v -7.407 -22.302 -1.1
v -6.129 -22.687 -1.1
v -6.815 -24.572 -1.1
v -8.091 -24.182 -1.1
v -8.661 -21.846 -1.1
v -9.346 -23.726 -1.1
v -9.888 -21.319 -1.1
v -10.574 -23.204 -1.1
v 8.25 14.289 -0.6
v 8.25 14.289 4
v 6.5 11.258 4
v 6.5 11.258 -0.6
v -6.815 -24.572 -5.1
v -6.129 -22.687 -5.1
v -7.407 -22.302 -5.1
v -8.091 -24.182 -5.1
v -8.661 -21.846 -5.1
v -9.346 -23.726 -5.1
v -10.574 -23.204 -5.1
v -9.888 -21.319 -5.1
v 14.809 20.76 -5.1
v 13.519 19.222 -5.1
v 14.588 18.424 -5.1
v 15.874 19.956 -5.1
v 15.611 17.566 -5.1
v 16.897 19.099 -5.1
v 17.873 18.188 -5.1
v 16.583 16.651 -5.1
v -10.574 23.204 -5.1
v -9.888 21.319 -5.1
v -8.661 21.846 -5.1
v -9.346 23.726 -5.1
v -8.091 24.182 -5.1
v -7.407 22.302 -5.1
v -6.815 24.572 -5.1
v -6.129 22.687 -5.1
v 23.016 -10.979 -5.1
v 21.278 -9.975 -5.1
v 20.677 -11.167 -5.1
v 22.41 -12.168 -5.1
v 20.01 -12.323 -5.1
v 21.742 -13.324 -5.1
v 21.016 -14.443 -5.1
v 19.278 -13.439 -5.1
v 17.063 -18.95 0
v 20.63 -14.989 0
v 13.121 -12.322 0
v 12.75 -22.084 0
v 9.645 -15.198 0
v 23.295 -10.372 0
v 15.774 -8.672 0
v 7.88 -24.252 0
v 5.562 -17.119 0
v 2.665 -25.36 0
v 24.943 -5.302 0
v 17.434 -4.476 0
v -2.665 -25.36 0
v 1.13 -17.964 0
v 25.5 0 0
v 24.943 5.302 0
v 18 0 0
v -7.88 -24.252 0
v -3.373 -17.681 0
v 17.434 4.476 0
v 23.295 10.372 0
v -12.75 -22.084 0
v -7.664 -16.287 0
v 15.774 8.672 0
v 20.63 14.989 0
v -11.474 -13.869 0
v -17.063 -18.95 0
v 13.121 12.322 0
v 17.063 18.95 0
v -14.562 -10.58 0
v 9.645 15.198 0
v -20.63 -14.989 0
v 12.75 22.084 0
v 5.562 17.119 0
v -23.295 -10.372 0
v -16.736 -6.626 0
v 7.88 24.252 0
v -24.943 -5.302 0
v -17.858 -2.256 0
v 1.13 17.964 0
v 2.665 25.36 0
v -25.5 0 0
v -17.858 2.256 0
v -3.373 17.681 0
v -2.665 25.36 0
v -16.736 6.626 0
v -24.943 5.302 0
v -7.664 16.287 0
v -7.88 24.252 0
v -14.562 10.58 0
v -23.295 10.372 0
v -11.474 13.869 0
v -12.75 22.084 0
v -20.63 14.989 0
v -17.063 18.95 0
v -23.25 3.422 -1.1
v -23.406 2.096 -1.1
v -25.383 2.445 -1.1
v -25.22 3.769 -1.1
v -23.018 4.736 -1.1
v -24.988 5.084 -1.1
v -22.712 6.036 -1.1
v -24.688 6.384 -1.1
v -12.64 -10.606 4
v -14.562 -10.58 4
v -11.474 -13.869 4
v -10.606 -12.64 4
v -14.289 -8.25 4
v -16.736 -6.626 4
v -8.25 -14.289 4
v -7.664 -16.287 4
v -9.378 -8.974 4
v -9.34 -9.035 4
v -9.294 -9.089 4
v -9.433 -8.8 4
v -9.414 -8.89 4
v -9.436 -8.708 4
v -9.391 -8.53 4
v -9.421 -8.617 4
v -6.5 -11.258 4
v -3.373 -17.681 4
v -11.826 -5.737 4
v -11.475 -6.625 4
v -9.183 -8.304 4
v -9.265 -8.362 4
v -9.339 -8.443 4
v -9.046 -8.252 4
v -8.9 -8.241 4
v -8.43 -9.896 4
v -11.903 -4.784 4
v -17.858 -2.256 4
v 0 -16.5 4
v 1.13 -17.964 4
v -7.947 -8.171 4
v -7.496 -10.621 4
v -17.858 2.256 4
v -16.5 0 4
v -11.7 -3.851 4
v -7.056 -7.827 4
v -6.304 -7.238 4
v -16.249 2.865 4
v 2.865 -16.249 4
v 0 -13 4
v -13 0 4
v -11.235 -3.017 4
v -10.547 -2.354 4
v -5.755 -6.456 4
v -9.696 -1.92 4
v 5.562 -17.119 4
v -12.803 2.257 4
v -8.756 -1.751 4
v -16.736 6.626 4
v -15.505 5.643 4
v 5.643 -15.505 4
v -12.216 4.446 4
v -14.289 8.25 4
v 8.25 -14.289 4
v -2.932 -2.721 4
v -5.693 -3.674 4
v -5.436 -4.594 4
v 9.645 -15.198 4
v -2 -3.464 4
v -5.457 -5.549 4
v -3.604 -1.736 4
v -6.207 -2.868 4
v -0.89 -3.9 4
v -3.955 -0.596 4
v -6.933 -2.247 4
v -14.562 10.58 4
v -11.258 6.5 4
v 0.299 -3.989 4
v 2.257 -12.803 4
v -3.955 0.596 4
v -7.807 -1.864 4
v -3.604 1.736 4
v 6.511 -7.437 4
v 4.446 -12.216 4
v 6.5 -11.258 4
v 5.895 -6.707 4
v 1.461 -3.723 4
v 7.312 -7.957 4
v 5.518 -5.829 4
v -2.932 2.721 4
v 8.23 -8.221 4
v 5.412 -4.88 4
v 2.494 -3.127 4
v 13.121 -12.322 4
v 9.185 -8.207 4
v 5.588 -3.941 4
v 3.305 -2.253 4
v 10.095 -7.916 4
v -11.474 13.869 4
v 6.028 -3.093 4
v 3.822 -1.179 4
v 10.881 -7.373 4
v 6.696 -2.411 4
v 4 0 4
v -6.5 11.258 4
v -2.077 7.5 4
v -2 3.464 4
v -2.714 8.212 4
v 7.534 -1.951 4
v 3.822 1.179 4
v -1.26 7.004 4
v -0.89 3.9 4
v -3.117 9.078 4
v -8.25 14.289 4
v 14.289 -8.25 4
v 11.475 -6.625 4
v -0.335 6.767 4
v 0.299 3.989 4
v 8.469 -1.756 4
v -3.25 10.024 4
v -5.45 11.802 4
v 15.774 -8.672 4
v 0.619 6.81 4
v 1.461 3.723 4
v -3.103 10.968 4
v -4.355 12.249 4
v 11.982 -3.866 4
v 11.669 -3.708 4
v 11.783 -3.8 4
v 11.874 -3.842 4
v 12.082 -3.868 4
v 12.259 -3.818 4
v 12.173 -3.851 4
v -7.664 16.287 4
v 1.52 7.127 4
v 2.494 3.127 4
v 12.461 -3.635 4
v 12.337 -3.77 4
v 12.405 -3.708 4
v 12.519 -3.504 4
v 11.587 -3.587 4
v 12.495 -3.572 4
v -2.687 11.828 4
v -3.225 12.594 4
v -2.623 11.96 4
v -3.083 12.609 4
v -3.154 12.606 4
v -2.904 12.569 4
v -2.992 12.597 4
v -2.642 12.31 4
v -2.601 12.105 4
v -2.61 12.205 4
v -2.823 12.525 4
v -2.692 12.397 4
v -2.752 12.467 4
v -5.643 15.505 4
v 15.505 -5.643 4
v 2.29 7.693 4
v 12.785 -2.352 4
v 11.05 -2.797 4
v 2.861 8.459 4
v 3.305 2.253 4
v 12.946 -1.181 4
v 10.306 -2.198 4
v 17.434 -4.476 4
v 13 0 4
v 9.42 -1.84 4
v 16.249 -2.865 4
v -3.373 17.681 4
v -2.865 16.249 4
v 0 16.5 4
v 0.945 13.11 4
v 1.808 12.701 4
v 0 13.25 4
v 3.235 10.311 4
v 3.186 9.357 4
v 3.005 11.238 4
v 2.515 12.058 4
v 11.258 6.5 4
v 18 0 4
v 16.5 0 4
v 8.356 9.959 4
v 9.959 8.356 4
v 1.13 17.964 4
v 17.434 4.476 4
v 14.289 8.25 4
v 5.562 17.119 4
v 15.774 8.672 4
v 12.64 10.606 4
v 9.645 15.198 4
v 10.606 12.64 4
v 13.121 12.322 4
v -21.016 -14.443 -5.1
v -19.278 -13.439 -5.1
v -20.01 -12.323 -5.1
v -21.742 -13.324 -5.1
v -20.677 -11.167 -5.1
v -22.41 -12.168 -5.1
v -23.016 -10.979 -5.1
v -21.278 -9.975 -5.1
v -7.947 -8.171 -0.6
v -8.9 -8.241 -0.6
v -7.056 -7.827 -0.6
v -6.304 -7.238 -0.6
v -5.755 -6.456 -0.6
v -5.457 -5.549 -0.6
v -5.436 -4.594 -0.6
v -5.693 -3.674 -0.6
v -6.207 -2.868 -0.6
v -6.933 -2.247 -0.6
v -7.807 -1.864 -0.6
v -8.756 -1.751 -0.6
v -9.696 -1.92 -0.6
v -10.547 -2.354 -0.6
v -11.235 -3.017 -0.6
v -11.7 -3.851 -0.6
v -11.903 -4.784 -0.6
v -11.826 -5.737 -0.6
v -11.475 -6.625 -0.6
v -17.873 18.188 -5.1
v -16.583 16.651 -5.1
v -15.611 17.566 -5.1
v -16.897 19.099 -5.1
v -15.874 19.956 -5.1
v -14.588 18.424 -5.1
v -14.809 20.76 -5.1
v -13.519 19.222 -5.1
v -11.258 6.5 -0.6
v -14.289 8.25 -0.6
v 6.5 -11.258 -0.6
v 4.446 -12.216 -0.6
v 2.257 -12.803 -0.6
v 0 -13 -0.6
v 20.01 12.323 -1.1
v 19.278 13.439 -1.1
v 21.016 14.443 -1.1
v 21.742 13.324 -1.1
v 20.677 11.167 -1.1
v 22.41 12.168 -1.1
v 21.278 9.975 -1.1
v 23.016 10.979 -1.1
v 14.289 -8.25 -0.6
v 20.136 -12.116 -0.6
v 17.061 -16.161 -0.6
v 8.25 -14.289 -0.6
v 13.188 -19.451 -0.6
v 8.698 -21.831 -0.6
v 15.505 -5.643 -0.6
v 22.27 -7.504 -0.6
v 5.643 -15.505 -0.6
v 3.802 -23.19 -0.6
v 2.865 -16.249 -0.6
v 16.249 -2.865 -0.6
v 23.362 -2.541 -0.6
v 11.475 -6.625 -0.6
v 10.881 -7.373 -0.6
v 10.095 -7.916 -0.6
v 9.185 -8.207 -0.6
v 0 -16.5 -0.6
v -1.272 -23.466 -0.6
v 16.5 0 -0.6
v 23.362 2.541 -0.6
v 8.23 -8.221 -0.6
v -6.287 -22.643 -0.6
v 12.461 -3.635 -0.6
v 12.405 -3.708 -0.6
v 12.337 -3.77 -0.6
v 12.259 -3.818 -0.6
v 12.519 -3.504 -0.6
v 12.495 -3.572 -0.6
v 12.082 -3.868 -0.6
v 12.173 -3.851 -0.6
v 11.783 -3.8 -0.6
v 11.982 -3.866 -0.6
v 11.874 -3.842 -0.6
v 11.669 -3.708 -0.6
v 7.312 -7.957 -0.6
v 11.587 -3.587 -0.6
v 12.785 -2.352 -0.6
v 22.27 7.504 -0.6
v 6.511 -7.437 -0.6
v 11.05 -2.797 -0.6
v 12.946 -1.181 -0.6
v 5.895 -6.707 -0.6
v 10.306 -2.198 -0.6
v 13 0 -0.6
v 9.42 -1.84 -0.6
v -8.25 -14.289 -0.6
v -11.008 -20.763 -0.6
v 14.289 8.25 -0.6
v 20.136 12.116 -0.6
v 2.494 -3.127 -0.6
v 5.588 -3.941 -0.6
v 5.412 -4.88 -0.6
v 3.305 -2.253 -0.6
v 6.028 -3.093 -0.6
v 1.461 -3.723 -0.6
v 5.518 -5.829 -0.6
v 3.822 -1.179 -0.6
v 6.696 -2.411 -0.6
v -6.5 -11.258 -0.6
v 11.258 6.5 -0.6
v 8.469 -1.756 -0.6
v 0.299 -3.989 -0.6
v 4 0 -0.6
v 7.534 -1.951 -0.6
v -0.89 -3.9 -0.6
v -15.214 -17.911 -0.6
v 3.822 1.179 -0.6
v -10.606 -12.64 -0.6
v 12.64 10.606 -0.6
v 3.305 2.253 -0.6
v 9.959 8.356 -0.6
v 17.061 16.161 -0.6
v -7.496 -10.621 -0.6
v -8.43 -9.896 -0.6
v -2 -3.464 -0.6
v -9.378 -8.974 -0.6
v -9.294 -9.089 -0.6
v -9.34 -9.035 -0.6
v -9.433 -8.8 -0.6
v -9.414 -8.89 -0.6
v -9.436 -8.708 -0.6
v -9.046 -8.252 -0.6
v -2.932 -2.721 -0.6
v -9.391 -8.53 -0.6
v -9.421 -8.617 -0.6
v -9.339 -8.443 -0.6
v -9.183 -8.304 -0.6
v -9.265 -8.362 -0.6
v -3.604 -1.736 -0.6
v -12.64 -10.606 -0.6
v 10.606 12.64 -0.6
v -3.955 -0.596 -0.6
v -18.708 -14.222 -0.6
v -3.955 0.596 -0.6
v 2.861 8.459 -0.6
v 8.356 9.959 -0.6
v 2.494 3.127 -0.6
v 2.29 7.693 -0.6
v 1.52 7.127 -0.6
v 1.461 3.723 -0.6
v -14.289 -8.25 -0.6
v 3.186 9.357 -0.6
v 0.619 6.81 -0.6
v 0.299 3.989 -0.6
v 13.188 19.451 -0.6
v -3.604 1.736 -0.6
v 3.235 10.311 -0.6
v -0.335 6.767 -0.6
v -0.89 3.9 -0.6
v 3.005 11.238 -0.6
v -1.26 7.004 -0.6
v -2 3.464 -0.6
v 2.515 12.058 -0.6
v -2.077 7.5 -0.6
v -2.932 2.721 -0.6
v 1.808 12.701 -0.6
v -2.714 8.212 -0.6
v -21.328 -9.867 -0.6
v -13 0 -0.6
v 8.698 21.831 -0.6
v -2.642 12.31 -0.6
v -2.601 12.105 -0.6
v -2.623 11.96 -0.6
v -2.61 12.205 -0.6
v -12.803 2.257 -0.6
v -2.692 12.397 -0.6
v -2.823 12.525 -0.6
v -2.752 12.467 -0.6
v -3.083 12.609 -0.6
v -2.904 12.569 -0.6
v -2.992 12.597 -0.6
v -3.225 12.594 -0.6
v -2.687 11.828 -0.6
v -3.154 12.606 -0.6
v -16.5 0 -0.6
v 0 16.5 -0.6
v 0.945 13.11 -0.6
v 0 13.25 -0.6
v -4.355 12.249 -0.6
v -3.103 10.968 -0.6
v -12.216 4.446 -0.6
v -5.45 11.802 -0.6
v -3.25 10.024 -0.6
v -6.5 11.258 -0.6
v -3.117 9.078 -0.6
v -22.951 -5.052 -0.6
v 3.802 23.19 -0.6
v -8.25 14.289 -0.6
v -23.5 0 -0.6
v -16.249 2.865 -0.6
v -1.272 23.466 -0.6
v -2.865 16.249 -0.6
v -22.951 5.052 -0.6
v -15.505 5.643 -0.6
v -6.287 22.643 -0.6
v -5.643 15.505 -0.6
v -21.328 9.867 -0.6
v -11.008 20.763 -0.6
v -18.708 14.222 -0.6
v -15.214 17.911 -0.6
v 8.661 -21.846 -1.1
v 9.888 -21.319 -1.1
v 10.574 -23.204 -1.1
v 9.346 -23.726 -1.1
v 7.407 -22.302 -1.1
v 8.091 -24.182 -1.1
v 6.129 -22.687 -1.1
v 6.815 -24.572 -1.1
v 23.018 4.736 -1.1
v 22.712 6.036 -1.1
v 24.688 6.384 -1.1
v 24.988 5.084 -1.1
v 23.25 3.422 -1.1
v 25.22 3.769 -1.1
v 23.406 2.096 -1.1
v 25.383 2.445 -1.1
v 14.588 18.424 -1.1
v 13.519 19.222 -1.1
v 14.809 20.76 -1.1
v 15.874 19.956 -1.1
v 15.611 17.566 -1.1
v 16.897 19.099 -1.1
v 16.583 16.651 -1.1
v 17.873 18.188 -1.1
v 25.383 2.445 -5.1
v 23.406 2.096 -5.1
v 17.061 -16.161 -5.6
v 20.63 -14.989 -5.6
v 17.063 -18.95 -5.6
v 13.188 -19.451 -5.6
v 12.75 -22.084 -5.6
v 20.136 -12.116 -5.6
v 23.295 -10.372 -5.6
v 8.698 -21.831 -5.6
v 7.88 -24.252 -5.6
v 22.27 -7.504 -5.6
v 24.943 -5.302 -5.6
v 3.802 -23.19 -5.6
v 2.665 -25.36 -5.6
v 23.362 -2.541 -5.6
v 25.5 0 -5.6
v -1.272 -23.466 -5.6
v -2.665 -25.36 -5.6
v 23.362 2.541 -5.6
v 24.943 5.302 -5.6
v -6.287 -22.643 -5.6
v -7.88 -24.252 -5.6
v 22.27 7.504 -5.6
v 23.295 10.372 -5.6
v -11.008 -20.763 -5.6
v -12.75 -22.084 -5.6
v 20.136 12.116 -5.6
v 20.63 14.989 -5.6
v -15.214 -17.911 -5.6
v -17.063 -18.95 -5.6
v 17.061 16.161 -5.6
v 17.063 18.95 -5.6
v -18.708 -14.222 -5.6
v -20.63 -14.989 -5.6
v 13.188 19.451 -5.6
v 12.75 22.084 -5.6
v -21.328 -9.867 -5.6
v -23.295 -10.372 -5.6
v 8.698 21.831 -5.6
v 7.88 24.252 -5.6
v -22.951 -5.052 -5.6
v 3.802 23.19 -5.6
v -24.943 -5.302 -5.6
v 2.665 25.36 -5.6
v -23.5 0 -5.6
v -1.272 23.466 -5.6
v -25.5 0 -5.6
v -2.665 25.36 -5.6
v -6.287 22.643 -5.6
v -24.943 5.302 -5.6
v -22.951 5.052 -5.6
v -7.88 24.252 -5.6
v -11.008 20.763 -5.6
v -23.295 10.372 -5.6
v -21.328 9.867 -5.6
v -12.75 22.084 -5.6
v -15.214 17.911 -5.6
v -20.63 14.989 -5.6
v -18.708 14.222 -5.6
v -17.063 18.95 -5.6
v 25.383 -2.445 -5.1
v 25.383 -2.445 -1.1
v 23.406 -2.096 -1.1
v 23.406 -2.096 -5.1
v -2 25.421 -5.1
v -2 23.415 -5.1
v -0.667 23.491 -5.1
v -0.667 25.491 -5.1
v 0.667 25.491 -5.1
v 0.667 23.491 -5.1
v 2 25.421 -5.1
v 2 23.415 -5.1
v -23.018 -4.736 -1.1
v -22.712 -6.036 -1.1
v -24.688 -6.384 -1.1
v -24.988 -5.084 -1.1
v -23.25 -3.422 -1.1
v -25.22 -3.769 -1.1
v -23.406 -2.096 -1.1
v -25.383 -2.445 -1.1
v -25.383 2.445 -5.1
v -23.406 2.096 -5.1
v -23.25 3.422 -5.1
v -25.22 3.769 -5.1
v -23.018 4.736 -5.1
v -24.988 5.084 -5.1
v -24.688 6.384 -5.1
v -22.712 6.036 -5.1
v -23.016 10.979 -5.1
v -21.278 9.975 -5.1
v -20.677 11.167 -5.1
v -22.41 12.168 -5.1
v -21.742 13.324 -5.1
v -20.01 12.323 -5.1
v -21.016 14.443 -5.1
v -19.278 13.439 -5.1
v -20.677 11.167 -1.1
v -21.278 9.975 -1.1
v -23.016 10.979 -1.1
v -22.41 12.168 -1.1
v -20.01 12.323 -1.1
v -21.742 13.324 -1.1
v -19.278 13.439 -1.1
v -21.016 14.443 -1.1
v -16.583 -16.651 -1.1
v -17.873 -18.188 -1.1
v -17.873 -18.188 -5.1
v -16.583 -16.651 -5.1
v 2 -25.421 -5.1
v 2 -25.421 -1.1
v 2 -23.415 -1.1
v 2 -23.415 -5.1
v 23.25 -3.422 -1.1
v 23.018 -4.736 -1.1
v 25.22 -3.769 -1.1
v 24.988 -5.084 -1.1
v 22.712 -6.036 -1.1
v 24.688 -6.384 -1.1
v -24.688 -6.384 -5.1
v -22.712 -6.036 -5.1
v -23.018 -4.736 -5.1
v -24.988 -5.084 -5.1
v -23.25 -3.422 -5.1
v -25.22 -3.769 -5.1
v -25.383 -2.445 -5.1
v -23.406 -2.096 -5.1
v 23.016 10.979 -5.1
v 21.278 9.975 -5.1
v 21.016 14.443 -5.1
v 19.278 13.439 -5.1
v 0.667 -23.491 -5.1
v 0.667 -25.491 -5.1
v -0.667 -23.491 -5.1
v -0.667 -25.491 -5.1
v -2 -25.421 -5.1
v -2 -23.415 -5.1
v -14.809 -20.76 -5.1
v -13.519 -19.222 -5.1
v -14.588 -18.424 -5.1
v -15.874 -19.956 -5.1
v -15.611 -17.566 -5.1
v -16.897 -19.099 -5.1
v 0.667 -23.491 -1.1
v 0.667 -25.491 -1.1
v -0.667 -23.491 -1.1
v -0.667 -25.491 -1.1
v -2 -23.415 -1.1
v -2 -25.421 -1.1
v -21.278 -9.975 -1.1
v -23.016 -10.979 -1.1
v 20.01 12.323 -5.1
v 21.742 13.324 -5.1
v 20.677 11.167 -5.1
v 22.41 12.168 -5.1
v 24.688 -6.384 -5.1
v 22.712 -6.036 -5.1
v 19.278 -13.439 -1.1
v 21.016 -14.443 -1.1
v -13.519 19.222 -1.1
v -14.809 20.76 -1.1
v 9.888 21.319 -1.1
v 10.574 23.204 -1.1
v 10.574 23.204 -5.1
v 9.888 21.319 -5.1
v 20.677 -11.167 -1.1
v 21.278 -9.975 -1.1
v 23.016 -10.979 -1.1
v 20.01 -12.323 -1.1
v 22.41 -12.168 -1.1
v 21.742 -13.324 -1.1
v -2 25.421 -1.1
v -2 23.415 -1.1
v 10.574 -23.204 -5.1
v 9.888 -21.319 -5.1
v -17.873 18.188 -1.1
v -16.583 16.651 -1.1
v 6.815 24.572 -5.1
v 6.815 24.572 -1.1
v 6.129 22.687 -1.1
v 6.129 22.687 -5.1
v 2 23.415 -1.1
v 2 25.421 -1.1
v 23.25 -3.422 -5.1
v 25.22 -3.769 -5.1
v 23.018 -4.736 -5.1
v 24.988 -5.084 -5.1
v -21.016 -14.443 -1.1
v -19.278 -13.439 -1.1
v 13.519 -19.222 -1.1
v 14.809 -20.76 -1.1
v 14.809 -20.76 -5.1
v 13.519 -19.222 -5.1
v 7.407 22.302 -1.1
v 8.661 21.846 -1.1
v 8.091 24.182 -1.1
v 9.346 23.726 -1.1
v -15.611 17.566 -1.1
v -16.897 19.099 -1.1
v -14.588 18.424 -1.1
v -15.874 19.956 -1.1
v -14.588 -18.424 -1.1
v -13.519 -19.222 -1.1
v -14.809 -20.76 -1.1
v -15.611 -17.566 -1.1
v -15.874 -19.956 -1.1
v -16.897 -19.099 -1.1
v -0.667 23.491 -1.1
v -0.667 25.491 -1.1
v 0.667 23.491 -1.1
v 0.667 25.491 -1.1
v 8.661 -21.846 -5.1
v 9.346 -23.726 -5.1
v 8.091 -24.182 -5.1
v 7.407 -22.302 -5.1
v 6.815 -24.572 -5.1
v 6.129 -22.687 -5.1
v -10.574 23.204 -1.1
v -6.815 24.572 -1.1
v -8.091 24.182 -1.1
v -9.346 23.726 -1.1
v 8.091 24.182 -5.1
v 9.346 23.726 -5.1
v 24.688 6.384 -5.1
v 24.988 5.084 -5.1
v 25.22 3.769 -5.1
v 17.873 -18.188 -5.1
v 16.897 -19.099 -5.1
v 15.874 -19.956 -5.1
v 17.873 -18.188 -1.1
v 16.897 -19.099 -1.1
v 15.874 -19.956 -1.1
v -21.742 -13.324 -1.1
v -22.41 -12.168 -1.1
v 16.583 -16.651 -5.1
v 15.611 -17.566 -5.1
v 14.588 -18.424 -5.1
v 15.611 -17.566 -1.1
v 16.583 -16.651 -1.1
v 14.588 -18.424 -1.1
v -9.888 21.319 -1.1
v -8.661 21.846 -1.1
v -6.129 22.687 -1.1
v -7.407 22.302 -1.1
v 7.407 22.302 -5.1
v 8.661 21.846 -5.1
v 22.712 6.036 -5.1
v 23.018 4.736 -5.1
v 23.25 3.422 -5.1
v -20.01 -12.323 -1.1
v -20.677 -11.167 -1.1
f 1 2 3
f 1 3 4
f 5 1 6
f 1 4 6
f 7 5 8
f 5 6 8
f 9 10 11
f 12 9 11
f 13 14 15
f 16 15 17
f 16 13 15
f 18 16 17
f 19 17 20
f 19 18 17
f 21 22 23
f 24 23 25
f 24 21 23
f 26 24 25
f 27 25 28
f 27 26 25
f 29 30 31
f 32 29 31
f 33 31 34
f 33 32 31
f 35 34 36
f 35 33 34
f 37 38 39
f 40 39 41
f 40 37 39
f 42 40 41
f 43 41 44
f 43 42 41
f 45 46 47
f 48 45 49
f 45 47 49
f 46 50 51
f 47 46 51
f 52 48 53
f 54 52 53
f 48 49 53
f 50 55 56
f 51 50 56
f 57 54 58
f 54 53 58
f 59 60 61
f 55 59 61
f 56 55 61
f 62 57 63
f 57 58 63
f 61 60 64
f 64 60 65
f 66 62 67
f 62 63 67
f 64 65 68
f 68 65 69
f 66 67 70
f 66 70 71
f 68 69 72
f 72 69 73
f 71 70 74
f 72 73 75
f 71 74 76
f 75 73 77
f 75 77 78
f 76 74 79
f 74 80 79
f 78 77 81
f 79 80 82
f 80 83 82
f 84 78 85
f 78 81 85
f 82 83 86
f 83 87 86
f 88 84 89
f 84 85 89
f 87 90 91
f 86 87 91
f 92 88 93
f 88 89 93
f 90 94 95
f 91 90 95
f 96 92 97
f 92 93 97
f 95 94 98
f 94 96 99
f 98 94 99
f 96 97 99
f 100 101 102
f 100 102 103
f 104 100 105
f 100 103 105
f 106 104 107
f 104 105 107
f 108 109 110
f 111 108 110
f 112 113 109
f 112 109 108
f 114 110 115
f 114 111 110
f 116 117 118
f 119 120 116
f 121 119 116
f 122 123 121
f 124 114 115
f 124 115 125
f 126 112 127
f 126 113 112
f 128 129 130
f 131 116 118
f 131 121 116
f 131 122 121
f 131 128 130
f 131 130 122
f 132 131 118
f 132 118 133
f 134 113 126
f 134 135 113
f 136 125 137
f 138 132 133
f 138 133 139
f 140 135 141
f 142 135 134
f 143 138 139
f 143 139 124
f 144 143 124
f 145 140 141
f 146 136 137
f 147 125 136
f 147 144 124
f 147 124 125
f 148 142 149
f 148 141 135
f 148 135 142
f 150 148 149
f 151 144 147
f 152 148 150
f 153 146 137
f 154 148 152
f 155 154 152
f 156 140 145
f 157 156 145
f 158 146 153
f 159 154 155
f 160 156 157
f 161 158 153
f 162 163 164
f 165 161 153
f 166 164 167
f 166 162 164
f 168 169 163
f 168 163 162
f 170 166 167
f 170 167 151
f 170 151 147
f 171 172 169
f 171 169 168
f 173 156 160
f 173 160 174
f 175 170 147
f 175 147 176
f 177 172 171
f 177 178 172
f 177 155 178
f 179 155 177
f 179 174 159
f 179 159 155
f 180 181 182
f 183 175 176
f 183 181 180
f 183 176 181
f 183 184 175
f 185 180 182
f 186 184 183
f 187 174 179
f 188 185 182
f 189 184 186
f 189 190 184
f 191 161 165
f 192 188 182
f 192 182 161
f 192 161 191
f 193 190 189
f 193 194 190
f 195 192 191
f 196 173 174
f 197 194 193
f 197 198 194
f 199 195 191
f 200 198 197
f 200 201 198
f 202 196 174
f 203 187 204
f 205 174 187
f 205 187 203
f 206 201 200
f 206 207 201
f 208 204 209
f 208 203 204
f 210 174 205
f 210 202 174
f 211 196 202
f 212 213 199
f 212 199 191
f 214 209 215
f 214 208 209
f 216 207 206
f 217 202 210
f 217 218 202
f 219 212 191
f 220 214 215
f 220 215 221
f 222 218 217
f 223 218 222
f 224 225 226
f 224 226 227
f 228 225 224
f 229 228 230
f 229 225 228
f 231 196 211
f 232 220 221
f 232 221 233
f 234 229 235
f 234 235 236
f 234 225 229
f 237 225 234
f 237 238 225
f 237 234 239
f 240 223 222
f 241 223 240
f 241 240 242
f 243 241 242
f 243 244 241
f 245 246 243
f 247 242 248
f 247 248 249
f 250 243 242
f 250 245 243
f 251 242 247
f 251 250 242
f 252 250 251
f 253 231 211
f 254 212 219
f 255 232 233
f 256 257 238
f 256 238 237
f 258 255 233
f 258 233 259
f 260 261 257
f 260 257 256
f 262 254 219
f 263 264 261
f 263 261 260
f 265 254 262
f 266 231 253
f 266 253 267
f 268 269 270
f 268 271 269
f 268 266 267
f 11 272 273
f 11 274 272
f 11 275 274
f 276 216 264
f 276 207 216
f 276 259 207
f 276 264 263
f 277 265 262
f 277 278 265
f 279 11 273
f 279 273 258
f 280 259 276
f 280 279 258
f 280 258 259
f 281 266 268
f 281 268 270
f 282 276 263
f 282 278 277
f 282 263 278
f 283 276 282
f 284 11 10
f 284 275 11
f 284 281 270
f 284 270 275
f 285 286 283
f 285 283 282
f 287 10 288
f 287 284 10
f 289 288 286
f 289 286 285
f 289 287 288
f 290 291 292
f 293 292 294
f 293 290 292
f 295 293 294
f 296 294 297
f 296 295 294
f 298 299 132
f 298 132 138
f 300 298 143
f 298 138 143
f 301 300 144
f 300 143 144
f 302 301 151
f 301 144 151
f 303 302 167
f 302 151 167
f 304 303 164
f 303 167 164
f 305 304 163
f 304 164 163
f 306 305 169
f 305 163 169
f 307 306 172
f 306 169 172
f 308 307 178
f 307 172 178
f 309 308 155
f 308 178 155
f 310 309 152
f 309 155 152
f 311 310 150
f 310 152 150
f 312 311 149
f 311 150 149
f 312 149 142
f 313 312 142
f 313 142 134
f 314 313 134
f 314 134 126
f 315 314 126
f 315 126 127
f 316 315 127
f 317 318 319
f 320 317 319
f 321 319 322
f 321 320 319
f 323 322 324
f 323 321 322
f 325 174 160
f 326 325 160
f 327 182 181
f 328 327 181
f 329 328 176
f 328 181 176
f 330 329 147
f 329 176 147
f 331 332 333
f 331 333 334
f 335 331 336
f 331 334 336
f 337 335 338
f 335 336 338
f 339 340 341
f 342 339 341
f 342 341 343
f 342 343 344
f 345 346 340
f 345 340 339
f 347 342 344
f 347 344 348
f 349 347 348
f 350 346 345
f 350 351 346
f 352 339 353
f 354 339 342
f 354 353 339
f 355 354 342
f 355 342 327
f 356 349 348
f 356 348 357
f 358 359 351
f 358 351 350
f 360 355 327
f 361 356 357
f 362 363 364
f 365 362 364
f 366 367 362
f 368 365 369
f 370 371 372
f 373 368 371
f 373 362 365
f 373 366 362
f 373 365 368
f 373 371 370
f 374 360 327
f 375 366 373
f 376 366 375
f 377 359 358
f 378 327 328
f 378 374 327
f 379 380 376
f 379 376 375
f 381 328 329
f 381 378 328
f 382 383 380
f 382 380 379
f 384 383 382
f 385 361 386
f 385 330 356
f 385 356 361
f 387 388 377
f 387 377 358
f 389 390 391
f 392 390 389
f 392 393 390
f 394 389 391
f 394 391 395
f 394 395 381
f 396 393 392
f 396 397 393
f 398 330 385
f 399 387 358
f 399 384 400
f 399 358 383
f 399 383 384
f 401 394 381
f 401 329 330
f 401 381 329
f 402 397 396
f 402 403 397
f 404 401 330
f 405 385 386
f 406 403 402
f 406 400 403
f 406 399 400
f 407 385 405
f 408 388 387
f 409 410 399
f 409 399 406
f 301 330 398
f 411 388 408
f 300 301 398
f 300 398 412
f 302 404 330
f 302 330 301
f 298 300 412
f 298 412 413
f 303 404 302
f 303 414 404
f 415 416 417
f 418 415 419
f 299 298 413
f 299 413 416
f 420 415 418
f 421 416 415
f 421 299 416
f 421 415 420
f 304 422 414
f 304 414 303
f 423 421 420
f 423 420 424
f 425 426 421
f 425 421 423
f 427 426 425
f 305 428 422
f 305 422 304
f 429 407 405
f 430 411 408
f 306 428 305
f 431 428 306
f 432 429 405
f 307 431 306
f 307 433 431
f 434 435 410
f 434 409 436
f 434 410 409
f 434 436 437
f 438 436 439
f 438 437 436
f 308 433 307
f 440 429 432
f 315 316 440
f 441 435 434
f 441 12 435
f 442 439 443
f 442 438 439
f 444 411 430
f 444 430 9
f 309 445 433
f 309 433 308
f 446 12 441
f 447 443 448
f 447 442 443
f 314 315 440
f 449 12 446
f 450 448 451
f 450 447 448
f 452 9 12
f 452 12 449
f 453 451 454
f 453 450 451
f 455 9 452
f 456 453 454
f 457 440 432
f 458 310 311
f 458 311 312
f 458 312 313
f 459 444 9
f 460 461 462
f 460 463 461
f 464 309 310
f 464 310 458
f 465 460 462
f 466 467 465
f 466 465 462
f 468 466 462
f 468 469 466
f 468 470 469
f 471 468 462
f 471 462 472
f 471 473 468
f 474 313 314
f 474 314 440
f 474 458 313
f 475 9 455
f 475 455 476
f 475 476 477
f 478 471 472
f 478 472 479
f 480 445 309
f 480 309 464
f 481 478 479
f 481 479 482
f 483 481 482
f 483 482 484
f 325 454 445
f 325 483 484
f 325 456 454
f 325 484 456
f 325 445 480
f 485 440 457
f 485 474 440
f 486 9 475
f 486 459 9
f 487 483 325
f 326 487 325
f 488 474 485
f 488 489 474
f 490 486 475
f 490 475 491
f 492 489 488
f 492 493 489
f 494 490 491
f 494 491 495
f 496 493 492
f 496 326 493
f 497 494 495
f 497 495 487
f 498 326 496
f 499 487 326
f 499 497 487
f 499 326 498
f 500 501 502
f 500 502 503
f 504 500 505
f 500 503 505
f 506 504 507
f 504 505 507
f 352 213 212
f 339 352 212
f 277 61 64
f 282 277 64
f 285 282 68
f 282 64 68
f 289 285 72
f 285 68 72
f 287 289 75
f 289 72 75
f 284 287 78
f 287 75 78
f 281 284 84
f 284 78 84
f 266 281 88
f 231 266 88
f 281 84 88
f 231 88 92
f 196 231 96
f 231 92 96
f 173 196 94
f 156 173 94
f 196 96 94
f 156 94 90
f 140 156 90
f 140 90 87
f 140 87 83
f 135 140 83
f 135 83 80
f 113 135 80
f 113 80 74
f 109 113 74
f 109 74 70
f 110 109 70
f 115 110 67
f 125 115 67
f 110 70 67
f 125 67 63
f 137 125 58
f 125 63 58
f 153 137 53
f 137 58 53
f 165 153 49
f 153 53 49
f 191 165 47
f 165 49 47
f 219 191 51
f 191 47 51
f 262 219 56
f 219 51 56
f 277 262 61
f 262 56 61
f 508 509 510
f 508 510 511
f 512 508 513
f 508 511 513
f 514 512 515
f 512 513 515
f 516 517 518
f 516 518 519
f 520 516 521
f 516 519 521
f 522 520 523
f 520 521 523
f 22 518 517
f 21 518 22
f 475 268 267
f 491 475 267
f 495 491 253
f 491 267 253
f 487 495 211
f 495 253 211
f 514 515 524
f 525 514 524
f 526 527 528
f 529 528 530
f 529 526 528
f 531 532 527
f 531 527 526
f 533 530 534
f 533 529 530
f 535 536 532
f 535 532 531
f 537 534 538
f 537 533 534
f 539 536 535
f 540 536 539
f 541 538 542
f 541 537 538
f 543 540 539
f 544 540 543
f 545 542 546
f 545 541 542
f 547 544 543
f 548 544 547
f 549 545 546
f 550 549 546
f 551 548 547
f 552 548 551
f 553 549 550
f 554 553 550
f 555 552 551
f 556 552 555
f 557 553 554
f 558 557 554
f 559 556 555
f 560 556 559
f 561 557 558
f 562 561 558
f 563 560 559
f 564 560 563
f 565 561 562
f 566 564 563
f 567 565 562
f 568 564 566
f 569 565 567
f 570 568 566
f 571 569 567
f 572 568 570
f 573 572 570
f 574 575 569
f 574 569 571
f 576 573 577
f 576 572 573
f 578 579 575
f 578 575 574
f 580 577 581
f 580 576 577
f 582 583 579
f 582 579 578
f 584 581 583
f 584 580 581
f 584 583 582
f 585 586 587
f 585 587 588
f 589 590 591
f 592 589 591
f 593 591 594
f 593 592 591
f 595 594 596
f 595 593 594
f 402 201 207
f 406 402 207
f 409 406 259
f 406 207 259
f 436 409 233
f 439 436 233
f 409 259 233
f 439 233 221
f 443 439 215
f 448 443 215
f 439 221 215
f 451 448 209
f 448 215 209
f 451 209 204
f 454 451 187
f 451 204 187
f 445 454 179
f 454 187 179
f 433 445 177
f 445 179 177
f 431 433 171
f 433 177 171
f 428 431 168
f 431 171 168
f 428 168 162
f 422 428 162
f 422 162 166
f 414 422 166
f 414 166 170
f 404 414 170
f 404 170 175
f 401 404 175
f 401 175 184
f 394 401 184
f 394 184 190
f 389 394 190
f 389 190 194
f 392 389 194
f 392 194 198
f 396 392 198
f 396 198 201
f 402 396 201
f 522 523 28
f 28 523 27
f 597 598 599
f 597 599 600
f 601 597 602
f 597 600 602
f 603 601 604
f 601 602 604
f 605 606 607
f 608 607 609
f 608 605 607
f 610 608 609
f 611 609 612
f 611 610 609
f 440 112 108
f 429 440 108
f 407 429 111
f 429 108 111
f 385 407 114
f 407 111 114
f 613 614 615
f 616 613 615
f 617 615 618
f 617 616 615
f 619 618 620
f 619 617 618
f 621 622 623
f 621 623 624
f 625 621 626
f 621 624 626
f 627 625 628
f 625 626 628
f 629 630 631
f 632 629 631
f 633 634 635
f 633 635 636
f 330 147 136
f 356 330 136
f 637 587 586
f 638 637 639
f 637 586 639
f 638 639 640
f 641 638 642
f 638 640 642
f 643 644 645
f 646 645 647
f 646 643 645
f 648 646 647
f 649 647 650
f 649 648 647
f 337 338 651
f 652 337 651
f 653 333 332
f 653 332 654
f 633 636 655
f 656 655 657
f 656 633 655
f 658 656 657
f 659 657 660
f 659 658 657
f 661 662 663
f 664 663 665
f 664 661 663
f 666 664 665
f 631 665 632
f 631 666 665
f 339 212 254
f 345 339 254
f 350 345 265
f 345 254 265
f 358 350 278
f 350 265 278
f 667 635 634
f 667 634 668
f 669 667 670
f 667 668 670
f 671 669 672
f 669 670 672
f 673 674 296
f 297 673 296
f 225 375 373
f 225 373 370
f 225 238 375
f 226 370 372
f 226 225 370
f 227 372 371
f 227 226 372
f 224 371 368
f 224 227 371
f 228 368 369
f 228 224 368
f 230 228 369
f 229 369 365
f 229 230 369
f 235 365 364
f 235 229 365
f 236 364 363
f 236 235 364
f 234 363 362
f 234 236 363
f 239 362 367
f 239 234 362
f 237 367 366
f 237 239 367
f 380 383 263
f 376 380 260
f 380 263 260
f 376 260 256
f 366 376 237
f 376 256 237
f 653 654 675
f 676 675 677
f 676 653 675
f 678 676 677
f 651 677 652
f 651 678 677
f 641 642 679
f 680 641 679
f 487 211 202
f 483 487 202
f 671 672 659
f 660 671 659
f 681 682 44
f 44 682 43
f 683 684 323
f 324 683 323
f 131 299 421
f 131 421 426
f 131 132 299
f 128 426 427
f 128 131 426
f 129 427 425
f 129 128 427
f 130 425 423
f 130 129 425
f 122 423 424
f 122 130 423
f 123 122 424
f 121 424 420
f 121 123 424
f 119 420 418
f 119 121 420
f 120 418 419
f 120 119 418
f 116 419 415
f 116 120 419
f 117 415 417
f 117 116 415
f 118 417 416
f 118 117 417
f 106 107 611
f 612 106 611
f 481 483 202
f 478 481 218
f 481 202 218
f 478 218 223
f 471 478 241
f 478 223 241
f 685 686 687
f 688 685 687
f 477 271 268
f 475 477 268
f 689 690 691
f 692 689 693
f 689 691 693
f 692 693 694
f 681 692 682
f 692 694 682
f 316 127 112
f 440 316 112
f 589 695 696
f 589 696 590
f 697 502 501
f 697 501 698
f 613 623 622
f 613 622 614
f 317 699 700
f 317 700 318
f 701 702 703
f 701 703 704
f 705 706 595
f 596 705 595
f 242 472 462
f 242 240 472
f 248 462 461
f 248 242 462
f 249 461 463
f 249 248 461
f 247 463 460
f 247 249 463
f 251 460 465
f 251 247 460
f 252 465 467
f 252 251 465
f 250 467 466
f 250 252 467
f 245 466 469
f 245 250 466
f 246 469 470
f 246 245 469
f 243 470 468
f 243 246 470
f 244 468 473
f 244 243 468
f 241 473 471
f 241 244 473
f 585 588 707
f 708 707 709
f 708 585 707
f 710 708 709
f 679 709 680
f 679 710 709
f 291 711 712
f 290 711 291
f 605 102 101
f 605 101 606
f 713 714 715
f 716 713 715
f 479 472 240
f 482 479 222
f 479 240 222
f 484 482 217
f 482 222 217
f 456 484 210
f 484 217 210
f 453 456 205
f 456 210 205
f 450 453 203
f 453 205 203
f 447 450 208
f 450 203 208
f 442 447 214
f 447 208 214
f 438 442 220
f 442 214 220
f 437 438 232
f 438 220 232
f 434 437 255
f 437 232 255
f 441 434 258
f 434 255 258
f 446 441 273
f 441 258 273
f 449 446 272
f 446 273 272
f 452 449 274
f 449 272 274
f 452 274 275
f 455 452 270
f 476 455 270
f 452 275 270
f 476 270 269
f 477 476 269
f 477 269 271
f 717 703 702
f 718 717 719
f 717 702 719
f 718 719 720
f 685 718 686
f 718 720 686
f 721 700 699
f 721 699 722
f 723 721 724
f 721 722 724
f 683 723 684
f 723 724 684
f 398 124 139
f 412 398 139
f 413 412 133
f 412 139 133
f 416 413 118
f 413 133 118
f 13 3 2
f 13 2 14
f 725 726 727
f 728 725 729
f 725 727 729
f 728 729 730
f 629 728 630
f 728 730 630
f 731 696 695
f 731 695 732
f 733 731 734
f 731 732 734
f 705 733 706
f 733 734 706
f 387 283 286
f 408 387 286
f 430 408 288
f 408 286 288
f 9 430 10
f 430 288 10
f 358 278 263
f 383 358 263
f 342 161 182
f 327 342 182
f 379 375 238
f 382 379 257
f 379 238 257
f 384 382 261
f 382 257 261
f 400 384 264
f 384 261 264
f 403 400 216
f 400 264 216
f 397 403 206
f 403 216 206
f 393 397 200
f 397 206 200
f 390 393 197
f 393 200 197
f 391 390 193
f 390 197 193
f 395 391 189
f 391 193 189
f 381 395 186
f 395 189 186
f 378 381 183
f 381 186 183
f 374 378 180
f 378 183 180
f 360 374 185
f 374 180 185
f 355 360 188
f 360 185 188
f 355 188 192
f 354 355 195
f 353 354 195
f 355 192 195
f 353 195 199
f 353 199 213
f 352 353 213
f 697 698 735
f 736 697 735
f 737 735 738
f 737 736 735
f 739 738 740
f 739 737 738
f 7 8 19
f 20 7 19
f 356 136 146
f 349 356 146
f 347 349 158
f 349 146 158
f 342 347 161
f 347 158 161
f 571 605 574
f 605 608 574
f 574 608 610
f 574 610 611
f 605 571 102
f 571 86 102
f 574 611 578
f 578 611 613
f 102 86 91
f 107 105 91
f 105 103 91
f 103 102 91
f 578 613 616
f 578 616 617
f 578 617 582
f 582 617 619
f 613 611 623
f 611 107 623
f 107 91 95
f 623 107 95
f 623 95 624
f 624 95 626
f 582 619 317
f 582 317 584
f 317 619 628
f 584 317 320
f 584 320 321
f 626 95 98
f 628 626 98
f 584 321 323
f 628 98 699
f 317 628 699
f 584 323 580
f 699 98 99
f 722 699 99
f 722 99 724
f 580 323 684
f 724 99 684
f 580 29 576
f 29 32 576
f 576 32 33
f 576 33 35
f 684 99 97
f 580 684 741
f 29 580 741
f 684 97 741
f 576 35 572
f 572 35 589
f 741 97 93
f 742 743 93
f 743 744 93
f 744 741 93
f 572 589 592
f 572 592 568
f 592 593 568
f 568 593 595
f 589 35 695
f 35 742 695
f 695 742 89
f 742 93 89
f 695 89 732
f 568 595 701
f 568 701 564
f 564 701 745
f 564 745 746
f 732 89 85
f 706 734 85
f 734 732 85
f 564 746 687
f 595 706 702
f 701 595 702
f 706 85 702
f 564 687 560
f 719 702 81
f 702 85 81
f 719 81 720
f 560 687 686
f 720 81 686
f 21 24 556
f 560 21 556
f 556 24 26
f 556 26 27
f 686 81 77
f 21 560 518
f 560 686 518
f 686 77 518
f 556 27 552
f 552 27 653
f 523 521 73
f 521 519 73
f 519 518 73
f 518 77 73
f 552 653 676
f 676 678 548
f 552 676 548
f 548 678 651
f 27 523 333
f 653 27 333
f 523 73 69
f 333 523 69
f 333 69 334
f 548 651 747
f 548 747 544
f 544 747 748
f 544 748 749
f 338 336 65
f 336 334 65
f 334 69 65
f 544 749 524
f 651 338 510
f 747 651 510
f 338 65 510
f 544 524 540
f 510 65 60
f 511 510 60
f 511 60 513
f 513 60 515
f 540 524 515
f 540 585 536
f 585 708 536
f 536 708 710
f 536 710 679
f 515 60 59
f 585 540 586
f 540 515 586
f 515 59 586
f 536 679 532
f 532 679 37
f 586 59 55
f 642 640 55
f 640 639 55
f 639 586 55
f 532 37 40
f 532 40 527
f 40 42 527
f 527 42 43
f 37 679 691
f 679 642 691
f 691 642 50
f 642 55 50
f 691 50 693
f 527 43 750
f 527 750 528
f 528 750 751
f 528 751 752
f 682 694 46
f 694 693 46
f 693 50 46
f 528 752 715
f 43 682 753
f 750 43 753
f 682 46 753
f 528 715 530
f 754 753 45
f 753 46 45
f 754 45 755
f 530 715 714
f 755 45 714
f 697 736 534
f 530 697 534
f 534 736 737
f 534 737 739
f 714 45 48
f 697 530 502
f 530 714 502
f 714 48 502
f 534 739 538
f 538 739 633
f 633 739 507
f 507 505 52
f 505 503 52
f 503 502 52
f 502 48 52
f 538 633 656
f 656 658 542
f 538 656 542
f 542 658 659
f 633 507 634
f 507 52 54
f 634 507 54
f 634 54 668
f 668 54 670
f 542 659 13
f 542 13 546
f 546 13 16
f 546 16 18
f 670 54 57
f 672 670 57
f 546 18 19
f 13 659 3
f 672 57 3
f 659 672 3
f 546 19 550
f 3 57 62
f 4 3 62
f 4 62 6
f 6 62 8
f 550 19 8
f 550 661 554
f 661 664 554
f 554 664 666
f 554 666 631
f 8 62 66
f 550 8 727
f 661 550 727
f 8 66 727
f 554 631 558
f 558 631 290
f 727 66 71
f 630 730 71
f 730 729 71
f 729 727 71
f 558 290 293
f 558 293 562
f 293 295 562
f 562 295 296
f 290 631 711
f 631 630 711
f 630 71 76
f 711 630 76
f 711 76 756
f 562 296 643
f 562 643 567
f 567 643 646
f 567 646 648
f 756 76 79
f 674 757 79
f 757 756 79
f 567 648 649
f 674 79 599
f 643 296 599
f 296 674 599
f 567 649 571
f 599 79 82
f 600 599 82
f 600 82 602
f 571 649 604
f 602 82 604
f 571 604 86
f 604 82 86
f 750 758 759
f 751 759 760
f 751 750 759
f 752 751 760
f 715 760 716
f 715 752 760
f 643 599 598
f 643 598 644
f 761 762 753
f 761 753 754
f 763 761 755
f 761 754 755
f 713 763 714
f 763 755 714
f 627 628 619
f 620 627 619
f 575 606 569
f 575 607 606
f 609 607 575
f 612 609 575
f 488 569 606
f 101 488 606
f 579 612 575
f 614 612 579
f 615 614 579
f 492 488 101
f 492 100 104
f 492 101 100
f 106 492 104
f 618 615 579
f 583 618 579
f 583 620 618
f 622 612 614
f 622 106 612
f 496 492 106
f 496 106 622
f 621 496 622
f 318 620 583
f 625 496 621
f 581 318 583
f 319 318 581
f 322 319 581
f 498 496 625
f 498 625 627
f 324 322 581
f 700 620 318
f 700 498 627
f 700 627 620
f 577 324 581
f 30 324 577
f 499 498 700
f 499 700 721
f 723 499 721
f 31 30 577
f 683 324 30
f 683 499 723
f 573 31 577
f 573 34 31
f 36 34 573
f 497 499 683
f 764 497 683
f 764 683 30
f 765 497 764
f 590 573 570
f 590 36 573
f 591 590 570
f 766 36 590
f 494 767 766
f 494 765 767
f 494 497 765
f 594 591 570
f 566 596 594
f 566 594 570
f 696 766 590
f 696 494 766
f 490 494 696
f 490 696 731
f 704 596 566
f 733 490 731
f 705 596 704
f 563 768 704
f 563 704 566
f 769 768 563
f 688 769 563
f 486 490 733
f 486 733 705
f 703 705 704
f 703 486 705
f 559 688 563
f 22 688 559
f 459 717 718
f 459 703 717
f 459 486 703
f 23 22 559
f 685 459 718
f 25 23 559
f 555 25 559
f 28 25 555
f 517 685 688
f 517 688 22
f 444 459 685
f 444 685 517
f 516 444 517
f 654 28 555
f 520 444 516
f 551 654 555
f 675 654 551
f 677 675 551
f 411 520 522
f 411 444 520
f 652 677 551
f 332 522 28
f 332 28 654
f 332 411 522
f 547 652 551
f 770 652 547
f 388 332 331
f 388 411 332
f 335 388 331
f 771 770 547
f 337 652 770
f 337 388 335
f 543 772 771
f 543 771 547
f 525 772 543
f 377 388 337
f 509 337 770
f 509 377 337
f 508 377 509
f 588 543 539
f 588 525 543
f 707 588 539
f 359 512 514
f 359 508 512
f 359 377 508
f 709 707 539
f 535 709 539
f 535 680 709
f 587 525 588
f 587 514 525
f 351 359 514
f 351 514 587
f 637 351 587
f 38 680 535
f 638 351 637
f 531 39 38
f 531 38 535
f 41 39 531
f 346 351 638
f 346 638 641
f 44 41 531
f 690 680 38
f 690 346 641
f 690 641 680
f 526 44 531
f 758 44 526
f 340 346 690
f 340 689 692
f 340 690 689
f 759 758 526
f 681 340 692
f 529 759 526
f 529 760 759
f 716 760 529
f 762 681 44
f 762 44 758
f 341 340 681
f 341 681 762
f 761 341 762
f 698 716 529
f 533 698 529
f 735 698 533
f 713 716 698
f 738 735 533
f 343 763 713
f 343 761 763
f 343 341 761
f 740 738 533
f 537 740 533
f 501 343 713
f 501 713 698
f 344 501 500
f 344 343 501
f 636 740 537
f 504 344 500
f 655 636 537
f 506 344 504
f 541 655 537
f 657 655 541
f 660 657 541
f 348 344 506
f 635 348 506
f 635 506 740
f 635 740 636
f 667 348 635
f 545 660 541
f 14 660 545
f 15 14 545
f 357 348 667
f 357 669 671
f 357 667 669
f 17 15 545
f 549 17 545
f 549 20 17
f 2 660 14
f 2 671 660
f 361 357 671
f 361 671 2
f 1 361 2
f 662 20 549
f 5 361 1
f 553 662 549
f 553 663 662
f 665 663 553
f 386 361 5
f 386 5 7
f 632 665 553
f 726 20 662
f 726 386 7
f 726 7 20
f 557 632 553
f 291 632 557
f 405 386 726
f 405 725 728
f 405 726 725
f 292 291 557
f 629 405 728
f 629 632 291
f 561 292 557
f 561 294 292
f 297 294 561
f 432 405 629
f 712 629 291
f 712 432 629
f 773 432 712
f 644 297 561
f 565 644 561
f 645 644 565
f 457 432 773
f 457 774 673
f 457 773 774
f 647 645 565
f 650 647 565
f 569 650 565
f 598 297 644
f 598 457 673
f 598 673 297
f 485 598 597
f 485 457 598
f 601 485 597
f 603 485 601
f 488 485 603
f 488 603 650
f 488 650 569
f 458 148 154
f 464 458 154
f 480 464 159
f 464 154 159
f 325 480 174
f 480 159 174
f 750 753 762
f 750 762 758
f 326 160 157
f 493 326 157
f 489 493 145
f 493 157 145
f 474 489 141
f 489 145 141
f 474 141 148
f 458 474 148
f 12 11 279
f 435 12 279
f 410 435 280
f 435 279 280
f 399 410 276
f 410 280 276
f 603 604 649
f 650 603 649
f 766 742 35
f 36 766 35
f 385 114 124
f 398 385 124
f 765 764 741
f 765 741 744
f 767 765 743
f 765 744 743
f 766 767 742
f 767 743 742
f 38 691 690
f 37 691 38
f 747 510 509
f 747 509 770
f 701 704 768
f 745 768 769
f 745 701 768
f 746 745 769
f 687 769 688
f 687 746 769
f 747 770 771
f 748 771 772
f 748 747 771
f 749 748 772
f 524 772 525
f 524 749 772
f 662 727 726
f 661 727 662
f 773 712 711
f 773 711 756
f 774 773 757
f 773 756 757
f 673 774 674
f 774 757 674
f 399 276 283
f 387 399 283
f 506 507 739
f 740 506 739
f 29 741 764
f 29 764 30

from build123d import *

# Parameters (mm, degrees)
ESQUISSE1_R                  = 18
BOSS_EXTRU_1_DEPTH           = 4
ESQUISSE5_R                  = 25.5
BOSS_EXTRU_2_DEPTH           = 0.6
ENL_V_MAT_EXTRU_1_DEPTH      = 37.354642069
ESQUISSE4_R                  = 4
ENL_V_MAT_EXTRU_3_DEPTH      = 37.354642069
R_P_TITION_CIRCULAIRE1_COUNT = 6
ESQUISSE3_R                  = 3.25
ENL_V_MAT_EXTRU_2_DEPTH      = 37.354642069
R_P_TITION_CIRCULAIRE2_COUNT = 3
CONG_1_R                     = 0.5
ESQUISSE6_R                  = 25.5
ESQUISSE6_R_2                = 23.5
BOSS_EXTRU_3_DEPTH           = 5
ESQUISSE7_W                  = 4
ESQUISSE7_H                  = 4
ENL_V_MAT_EXTRU_4_DEPTH      = 4
R_P_TITION_CIRCULAIRE3_COUNT = 18


with BuildPart() as part:
    # Esquisse1 → Boss.-Extru.1 (new body)
    with BuildSketch(Plane.XY):
        Circle(ESQUISSE1_R)
    extrude(amount=BOSS_EXTRU_1_DEPTH)

    # Esquisse5 → Boss.-Extru.2 (add)
    with BuildSketch(Plane(origin=(0, 0, 0), x_dir=(-1, 0, 0), z_dir=(0, 0, -1))):
        Circle(ESQUISSE5_R)
    extrude(amount=BOSS_EXTRU_2_DEPTH)

    # Esquisse2 → Enlèv. mat.-Extru.1 (cut, through all)
    with BuildSketch(Plane.XY.offset(4)):
        with BuildLine():
            Line((0, 13), (0, 16.5))
            ThreePointArc((0, 16.5), (-4.270514244, 15.937776134), (-8.25, 14.289419162))
            Line((-8.25, 14.289419162), (-6.5, 11.258330249))
            ThreePointArc((-6.5, 11.258330249), (-3.364647586, 12.557035742), (0, 13))
        make_face()
    enl_v_mat_extru_1 = extrude(amount=-ENL_V_MAT_EXTRU_1_DEPTH, mode=Mode.SUBTRACT)

    # Esquisse4 → Enlèv. mat.-Extru.3 (cut, through all)
    with BuildSketch(Plane.XY.offset(4)):
        Circle(ESQUISSE4_R)
    extrude(amount=-ENL_V_MAT_EXTRU_3_DEPTH, mode=Mode.SUBTRACT)

    # Répétition circulaire1: Enlèv. mat.-Extru.1 ×6 about axis
    r_p_tition_circulaire1_axis = Axis((0, 0, 4), (0, 0, 1))
    for i in range(1, R_P_TITION_CIRCULAIRE1_COUNT):
        add(enl_v_mat_extru_1.rotate(r_p_tition_circulaire1_axis, i * 360 / R_P_TITION_CIRCULAIRE1_COUNT), mode=Mode.SUBTRACT)

    # Esquisse3 → Enlèv. mat.-Extru.2 (cut, through all)
    with BuildSketch(Plane.XY.offset(4)):
        with Locations((0, 10)):
            Circle(ESQUISSE3_R)
    enl_v_mat_extru_2 = extrude(amount=-ENL_V_MAT_EXTRU_2_DEPTH, mode=Mode.SUBTRACT)

    # Répétition circulaire2: Enlèv. mat.-Extru.2 ×3 about axis
    r_p_tition_circulaire2_axis = Axis((0, 0, 4), (0, 0, 1))
    for i in range(1, R_P_TITION_CIRCULAIRE2_COUNT):
        add(enl_v_mat_extru_2.rotate(r_p_tition_circulaire2_axis, i * 360 / R_P_TITION_CIRCULAIRE2_COUNT), mode=Mode.SUBTRACT)

    # Congé1
    cong_1_edges = [part.edges().sort_by_distance(p)[0] for p in [
        (11.902210222, -5.228517173, 1.7),
        (-10.479133807, -7.693357827, 1.7),
        (-1.423076416, 12.921875, 1.7),
    ]]
    fillet(cong_1_edges, radius=CONG_1_R)

    # Esquisse6 → Boss.-Extru.3 (add)
    with BuildSketch(Plane(origin=(0, 0, -0.6), x_dir=(-1, 0, 0), z_dir=(0, 0, -1))):
        Circle(ESQUISSE6_R)
        Circle(ESQUISSE6_R_2, mode=Mode.SUBTRACT)
    extrude(amount=BOSS_EXTRU_3_DEPTH)

    # Esquisse7 → Enlèv. mat.-Extru.4 (cut)
    with BuildSketch(Plane(origin=(0, 25.5, 0), x_dir=(1, 0, 0), z_dir=(0, 1, 0))):
        with Locations((0, 3.1)):
            Rectangle(ESQUISSE7_W, ESQUISSE7_H)
    enl_v_mat_extru_4 = extrude(amount=-ENL_V_MAT_EXTRU_4_DEPTH, mode=Mode.SUBTRACT)

    # Répétition circulaire3: Enlèv. mat.-Extru.4 ×18 about axis
    r_p_tition_circulaire3_axis = Axis((0, 0, -0.6), (0, 0, 1))
    for i in range(1, R_P_TITION_CIRCULAIRE3_COUNT):
        add(enl_v_mat_extru_4.rotate(r_p_tition_circulaire3_axis, i * 360 / R_P_TITION_CIRCULAIRE3_COUNT), mode=Mode.SUBTRACT)


solid = part.part
